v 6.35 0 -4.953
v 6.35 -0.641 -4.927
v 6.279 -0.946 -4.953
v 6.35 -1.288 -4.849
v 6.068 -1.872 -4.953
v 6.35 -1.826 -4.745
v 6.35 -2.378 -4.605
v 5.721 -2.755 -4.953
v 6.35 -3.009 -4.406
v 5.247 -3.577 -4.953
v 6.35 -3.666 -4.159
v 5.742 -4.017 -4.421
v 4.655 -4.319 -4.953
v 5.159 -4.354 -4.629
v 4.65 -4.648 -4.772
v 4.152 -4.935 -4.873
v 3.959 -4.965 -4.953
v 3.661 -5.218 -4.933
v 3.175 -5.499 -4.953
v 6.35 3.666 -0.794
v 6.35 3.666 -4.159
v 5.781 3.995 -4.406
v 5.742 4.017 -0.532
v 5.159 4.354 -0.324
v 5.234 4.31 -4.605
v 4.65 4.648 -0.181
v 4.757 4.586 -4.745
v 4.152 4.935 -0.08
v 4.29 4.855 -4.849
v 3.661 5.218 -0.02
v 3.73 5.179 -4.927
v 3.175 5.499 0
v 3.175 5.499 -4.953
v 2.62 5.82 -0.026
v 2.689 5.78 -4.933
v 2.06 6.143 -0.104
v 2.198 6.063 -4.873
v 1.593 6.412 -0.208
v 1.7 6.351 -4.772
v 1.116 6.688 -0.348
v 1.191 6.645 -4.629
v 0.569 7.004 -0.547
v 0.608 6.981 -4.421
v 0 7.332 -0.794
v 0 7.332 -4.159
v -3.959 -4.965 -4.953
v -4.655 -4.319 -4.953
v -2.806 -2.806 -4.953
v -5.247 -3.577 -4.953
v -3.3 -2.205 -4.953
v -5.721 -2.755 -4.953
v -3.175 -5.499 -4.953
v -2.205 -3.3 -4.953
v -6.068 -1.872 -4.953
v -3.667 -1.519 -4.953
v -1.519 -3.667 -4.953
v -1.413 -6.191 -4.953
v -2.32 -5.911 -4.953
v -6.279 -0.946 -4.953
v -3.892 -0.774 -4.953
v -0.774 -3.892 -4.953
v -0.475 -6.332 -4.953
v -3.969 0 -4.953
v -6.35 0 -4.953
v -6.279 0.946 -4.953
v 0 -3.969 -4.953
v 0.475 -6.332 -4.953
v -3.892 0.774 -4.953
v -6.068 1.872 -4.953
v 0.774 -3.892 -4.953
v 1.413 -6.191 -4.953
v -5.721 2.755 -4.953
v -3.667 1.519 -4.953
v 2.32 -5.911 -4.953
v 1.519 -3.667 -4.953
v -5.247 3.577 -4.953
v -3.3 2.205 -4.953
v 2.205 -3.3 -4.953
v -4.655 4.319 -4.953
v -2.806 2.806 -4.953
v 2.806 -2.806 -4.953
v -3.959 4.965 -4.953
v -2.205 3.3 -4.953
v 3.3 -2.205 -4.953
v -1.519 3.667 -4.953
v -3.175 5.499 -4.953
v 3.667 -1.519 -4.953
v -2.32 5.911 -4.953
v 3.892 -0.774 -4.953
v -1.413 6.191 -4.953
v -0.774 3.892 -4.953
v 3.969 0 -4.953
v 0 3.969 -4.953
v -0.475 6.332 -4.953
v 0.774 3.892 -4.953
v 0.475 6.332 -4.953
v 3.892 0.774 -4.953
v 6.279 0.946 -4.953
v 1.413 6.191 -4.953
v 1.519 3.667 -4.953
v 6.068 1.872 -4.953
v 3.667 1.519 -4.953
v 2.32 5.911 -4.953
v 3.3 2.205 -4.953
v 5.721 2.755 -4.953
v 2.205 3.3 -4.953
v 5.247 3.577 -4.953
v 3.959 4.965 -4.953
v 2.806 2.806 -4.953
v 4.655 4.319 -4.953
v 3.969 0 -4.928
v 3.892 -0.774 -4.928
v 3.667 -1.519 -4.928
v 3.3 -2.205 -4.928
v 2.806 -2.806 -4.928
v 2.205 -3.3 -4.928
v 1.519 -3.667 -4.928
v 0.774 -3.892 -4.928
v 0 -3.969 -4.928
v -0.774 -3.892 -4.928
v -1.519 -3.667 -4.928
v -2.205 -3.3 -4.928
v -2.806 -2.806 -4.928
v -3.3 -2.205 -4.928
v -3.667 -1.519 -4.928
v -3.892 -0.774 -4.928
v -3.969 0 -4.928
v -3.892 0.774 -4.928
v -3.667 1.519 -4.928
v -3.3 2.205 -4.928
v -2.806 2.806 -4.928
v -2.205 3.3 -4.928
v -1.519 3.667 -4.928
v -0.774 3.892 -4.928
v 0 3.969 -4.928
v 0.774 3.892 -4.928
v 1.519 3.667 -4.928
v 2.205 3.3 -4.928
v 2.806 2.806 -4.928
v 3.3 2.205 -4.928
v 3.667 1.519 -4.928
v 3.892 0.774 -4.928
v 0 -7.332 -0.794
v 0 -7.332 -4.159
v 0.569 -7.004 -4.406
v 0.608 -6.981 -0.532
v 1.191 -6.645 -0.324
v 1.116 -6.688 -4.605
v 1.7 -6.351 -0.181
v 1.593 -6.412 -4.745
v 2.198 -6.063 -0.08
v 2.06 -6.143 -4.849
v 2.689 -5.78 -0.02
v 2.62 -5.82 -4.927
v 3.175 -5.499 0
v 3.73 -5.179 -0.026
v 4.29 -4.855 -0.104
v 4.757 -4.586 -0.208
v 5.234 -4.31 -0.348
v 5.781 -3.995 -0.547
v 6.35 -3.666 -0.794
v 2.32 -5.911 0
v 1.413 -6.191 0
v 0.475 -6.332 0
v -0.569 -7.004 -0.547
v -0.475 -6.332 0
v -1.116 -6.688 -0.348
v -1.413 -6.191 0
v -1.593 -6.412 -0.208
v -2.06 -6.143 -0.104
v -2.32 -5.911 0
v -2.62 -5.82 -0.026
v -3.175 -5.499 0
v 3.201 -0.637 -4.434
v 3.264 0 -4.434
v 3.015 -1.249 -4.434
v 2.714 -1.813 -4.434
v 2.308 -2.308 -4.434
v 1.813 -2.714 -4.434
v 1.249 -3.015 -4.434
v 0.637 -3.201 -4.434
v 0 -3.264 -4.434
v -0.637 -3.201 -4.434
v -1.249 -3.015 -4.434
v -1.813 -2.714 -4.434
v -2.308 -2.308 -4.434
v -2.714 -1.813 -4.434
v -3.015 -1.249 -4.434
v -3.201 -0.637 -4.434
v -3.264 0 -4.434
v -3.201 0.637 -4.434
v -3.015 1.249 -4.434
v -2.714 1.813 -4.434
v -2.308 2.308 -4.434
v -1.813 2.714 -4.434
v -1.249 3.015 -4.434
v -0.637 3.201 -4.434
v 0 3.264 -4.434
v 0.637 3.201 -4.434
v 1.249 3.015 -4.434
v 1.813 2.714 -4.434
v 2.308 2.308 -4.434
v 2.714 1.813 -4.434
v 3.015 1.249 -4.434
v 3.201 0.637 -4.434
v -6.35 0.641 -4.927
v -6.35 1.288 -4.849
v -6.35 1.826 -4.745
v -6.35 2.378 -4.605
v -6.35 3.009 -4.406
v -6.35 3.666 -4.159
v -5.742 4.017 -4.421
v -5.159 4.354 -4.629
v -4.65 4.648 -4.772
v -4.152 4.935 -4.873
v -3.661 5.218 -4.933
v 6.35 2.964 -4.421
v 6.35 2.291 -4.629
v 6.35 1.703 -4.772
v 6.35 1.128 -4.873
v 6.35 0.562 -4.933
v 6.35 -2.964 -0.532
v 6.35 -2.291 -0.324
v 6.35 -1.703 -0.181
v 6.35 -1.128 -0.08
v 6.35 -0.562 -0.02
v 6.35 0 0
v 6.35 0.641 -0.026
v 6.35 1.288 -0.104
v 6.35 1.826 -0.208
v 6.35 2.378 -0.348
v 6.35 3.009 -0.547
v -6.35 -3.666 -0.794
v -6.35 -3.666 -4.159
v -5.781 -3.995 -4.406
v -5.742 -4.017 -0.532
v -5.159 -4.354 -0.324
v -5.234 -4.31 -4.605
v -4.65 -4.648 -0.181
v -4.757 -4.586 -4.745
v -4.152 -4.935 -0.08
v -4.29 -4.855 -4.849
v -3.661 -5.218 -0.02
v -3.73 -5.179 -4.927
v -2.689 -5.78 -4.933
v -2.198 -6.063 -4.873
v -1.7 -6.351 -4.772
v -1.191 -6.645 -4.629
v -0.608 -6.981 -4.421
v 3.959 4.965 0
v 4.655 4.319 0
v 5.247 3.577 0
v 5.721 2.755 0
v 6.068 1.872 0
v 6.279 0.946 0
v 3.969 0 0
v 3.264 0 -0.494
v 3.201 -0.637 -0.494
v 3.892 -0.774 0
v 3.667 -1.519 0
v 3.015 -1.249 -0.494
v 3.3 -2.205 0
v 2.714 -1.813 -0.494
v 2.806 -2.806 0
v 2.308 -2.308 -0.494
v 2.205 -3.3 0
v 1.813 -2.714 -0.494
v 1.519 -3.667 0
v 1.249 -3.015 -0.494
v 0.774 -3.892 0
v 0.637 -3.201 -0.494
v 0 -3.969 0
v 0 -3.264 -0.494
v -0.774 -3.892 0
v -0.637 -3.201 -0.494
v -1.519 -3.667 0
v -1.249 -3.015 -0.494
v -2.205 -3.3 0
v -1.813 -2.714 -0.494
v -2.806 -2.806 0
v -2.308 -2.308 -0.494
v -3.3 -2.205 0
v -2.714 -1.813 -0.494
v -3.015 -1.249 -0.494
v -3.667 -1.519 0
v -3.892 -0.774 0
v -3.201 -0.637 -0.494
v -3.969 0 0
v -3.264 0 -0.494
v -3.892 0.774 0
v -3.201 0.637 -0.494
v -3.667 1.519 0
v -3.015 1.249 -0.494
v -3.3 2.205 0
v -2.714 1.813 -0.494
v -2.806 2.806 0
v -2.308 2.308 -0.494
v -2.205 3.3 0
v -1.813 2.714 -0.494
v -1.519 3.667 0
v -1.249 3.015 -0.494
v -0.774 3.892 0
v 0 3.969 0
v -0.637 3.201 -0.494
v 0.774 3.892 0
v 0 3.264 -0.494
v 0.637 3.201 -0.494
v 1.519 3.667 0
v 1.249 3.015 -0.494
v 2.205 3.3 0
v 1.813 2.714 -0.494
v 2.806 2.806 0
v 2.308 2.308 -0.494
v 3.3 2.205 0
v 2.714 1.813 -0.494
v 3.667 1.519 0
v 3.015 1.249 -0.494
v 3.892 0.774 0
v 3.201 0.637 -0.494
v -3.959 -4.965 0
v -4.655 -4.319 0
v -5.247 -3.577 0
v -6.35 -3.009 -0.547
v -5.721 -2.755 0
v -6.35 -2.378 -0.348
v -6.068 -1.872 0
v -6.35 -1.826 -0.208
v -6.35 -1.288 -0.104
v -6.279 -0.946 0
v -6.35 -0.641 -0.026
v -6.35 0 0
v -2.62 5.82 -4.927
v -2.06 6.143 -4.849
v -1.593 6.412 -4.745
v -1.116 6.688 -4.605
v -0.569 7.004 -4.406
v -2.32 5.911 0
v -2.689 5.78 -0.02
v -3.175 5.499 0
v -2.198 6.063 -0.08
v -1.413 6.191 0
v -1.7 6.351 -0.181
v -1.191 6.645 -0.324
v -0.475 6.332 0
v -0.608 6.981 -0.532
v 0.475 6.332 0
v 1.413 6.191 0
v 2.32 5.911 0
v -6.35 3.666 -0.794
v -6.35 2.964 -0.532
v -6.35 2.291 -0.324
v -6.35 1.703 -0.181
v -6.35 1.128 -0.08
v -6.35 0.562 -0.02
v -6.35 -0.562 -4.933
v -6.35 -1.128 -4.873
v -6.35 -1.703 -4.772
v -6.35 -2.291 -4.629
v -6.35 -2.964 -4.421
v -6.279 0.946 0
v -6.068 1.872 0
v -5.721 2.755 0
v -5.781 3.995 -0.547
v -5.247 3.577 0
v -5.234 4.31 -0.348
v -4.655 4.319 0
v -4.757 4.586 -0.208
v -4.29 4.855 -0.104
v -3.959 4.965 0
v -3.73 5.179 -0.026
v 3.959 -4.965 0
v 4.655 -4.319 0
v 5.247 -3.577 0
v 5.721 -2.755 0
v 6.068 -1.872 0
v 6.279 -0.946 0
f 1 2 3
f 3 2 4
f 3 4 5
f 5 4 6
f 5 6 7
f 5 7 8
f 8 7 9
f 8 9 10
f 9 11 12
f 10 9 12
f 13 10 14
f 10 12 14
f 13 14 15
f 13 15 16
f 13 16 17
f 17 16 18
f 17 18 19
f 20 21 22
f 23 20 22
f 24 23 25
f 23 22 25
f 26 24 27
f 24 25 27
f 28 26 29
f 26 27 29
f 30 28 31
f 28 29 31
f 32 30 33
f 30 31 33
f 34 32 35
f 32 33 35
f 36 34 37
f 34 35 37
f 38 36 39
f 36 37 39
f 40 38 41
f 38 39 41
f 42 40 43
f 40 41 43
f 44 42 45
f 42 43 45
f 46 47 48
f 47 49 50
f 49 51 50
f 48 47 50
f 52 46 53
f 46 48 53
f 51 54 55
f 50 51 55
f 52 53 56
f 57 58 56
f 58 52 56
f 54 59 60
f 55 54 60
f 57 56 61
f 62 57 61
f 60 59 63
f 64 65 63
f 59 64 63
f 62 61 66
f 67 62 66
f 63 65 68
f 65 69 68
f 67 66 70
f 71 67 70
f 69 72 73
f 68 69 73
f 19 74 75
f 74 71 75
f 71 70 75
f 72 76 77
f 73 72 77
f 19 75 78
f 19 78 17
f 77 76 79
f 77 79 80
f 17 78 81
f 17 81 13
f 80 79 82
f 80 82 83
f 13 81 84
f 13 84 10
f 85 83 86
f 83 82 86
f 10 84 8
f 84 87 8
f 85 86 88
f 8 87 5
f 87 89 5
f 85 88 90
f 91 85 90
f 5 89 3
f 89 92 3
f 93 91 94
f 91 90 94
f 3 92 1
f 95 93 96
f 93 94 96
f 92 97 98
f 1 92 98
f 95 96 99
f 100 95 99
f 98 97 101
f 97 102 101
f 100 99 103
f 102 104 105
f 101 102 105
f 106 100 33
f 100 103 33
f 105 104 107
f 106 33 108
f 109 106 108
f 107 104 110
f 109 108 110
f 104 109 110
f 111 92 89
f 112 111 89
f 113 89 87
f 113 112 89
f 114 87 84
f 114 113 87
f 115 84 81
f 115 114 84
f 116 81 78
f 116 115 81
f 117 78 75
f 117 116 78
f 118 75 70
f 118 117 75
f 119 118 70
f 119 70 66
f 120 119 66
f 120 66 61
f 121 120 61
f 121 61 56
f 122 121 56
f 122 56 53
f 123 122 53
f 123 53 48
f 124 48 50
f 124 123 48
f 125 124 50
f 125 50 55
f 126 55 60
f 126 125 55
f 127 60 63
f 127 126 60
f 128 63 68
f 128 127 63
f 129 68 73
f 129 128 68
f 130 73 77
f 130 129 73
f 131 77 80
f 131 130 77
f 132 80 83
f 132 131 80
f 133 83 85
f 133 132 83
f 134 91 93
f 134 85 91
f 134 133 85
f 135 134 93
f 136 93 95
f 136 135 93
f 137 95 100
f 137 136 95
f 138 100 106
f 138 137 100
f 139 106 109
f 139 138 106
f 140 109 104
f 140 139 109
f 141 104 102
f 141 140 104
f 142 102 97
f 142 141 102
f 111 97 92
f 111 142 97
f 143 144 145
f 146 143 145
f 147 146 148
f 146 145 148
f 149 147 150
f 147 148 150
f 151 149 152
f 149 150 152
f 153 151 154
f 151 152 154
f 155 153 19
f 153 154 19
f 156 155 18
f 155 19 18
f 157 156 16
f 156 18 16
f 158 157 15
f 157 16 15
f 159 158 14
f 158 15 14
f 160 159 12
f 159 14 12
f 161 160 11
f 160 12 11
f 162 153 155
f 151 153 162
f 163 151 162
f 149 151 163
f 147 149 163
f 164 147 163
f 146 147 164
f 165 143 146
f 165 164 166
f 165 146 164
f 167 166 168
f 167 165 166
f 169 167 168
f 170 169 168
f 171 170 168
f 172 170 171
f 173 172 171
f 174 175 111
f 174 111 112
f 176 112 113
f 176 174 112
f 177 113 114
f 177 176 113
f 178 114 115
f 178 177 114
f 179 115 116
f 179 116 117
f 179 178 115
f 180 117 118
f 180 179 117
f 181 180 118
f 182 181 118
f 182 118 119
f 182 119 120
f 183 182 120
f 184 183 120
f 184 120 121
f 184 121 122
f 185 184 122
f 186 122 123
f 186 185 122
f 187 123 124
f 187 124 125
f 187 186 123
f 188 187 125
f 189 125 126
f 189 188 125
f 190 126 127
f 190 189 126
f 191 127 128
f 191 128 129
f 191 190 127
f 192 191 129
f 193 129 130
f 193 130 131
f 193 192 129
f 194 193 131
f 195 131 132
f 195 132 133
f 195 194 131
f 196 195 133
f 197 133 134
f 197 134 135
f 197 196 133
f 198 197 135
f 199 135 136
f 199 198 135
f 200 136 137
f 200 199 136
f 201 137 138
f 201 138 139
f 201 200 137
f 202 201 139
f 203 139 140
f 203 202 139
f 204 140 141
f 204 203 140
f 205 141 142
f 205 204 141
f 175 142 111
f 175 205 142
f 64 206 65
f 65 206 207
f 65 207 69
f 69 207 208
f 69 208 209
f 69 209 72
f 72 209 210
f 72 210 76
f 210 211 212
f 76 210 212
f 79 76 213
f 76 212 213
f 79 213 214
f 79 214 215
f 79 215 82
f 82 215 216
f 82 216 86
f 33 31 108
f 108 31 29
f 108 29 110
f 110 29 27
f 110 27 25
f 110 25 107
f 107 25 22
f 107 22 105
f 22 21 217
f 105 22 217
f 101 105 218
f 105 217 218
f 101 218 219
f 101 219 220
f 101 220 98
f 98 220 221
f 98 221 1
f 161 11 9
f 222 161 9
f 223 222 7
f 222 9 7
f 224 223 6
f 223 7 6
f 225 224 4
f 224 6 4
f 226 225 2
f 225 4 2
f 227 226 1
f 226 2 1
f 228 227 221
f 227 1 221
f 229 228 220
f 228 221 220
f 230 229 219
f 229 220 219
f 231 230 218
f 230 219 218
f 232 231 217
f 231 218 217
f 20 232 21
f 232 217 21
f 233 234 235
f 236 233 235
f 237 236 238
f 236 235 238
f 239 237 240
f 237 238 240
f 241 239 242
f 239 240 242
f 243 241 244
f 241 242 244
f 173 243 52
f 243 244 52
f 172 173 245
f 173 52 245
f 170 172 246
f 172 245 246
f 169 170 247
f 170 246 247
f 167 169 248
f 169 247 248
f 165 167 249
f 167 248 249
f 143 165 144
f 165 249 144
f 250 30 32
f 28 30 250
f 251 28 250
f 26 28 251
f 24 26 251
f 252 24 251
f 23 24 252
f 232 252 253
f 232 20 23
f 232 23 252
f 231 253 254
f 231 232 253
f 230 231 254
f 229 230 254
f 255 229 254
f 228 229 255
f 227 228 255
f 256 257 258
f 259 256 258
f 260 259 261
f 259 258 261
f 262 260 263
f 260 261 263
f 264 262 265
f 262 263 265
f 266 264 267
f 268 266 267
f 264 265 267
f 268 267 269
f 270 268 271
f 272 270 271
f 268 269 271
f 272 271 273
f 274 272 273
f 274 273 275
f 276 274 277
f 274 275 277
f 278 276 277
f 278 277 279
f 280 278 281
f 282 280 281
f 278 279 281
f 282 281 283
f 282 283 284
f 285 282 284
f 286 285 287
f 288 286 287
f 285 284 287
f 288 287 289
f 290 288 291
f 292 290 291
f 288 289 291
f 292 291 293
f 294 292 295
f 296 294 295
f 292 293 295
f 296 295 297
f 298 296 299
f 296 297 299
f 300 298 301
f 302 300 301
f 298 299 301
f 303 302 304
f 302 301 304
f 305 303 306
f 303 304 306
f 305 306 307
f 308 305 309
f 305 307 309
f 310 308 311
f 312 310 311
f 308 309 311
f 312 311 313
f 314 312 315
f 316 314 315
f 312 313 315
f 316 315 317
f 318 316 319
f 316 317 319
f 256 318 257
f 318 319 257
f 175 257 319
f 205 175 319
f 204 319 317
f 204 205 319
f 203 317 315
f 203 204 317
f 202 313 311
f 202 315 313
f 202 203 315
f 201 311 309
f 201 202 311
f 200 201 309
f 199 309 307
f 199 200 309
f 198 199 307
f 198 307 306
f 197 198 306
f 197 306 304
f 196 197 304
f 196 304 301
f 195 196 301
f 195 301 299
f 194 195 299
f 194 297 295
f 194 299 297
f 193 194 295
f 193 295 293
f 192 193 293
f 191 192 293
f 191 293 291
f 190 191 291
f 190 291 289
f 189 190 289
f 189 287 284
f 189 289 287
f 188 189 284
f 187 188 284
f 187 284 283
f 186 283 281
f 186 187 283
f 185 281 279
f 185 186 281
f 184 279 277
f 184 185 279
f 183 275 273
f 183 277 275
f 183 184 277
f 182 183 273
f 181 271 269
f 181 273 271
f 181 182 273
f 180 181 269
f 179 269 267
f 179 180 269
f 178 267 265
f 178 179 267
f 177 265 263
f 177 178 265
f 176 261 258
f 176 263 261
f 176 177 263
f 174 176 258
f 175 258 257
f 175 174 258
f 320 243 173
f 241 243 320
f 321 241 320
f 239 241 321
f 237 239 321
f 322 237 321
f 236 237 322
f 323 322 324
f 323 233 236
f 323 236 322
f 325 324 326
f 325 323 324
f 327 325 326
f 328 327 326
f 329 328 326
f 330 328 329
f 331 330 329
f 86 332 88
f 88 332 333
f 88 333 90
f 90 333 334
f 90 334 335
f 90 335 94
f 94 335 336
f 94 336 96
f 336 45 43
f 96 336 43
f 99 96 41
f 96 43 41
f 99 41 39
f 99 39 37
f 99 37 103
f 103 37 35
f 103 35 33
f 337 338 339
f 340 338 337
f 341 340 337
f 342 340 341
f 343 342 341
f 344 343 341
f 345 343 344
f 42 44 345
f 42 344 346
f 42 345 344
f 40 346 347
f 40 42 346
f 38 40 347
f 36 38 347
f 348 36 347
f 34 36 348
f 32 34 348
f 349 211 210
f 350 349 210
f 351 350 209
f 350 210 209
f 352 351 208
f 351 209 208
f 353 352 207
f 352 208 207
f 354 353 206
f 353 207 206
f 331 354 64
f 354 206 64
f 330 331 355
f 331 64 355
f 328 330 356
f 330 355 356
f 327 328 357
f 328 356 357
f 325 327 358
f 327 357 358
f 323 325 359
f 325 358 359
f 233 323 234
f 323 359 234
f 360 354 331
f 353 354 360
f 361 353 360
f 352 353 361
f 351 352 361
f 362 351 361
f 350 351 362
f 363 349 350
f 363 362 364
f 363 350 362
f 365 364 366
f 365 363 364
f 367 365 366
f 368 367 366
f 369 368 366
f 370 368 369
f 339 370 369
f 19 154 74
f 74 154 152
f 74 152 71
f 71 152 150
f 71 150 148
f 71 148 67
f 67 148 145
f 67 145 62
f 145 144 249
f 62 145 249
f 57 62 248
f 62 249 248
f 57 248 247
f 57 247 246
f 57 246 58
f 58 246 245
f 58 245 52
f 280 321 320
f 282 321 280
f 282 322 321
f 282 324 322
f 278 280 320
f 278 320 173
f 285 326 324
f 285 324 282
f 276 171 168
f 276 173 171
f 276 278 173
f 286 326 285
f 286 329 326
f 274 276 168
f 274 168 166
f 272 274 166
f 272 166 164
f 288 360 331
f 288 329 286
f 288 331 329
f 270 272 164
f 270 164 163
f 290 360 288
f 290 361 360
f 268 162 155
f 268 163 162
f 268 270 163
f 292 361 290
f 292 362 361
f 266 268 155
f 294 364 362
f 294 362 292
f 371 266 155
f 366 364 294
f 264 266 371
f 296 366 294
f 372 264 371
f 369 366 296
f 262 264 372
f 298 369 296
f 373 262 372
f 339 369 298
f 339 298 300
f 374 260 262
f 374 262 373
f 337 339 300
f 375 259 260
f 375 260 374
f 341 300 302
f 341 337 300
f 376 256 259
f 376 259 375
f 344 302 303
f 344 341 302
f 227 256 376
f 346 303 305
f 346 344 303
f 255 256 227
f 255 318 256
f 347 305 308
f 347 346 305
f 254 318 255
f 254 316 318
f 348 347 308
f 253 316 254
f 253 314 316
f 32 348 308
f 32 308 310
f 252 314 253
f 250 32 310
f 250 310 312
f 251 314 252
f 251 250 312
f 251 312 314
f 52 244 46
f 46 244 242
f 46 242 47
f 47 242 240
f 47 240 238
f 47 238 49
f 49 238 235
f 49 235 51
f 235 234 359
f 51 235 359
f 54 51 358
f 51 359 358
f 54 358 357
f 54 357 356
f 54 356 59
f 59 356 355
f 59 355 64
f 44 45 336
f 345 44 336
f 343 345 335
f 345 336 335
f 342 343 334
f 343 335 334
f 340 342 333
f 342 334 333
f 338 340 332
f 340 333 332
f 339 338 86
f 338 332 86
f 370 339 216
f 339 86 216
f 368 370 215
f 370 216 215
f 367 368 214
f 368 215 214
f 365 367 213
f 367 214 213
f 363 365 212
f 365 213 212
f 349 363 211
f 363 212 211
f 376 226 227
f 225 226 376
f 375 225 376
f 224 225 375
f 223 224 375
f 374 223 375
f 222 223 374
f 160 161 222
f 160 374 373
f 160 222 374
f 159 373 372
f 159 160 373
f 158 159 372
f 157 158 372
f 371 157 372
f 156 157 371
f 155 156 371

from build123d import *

# Parameters (mm, degrees)
THREADSCHEMATIC_START     = -4.953
THREADSCHEMATIC_OUTLINE_R = 3.2639
THREADSCHEMATIC_DEPTH     = 4.953


# Read off the part's stored shape, not the designer's step: ThreadSchematic
with BuildPart() as part:
    # ThreadSchematic outline → ThreadSchematic (new body)
    with BuildSketch(Plane.XY.offset(THREADSCHEMATIC_START)):
        Polygon((6.35, 3.666174209), (0, 7.332348419), (-6.35, 3.666174209), (-6.35, -3.666174209), (0, -7.332348419), (6.35, -3.666174209), align=None)
        Circle(THREADSCHEMATIC_OUTLINE_R, mode=Mode.SUBTRACT)
    extrude(amount=THREADSCHEMATIC_DEPTH)

    # Sketch3 → Double-Chamfer (revolve, cut)
    with BuildSketch(Plane(origin=(0, 0, 0), x_dir=(0, 0, -1), z_dir=(1, 0, 0))):
        Polygon((4.953, 6.35), (4.15925, 7.332348419), (4.15925, 20.032348419), (17.653, 20.032348419), (17.653, 6.35), align=None)
        Polygon((0.79375, 20.032348419), (-12.7, 20.032348419), (-12.7, 6.35), (0, 6.35), (0.79375, 7.332348419), align=None)
    revolve(axis=Axis((0, 0, 0), (0, 0, -1)), mode=Mode.SUBTRACT)

    # EndChamferSke → EndChamfer (revolve, cut)
    with BuildSketch(Plane(origin=(0, 0, 0), x_dir=(0, 0, -1), z_dir=(1, 0, 0)), mode=Mode.PRIVATE) as endchamfer_sk:
        Polygon((4.9276, 3.96875), (4.384704588, 3.193415), (4.9784, 3.193415), (4.9784, 3.96875), align=None)
        Polygon((-0.0508, 3.96875), (0, 3.96875), (0.542895412, 3.193415), (-0.0508, 3.193415), align=None)
    revolve(endchamfer_sk.sketch.rotate(Axis((0, 0, -25.037505729), (0, 0, -1)), 90), axis=Axis((0, 0, -25.037505729), (0, 0, -1)), mode=Mode.SUBTRACT)


solid = part.part
